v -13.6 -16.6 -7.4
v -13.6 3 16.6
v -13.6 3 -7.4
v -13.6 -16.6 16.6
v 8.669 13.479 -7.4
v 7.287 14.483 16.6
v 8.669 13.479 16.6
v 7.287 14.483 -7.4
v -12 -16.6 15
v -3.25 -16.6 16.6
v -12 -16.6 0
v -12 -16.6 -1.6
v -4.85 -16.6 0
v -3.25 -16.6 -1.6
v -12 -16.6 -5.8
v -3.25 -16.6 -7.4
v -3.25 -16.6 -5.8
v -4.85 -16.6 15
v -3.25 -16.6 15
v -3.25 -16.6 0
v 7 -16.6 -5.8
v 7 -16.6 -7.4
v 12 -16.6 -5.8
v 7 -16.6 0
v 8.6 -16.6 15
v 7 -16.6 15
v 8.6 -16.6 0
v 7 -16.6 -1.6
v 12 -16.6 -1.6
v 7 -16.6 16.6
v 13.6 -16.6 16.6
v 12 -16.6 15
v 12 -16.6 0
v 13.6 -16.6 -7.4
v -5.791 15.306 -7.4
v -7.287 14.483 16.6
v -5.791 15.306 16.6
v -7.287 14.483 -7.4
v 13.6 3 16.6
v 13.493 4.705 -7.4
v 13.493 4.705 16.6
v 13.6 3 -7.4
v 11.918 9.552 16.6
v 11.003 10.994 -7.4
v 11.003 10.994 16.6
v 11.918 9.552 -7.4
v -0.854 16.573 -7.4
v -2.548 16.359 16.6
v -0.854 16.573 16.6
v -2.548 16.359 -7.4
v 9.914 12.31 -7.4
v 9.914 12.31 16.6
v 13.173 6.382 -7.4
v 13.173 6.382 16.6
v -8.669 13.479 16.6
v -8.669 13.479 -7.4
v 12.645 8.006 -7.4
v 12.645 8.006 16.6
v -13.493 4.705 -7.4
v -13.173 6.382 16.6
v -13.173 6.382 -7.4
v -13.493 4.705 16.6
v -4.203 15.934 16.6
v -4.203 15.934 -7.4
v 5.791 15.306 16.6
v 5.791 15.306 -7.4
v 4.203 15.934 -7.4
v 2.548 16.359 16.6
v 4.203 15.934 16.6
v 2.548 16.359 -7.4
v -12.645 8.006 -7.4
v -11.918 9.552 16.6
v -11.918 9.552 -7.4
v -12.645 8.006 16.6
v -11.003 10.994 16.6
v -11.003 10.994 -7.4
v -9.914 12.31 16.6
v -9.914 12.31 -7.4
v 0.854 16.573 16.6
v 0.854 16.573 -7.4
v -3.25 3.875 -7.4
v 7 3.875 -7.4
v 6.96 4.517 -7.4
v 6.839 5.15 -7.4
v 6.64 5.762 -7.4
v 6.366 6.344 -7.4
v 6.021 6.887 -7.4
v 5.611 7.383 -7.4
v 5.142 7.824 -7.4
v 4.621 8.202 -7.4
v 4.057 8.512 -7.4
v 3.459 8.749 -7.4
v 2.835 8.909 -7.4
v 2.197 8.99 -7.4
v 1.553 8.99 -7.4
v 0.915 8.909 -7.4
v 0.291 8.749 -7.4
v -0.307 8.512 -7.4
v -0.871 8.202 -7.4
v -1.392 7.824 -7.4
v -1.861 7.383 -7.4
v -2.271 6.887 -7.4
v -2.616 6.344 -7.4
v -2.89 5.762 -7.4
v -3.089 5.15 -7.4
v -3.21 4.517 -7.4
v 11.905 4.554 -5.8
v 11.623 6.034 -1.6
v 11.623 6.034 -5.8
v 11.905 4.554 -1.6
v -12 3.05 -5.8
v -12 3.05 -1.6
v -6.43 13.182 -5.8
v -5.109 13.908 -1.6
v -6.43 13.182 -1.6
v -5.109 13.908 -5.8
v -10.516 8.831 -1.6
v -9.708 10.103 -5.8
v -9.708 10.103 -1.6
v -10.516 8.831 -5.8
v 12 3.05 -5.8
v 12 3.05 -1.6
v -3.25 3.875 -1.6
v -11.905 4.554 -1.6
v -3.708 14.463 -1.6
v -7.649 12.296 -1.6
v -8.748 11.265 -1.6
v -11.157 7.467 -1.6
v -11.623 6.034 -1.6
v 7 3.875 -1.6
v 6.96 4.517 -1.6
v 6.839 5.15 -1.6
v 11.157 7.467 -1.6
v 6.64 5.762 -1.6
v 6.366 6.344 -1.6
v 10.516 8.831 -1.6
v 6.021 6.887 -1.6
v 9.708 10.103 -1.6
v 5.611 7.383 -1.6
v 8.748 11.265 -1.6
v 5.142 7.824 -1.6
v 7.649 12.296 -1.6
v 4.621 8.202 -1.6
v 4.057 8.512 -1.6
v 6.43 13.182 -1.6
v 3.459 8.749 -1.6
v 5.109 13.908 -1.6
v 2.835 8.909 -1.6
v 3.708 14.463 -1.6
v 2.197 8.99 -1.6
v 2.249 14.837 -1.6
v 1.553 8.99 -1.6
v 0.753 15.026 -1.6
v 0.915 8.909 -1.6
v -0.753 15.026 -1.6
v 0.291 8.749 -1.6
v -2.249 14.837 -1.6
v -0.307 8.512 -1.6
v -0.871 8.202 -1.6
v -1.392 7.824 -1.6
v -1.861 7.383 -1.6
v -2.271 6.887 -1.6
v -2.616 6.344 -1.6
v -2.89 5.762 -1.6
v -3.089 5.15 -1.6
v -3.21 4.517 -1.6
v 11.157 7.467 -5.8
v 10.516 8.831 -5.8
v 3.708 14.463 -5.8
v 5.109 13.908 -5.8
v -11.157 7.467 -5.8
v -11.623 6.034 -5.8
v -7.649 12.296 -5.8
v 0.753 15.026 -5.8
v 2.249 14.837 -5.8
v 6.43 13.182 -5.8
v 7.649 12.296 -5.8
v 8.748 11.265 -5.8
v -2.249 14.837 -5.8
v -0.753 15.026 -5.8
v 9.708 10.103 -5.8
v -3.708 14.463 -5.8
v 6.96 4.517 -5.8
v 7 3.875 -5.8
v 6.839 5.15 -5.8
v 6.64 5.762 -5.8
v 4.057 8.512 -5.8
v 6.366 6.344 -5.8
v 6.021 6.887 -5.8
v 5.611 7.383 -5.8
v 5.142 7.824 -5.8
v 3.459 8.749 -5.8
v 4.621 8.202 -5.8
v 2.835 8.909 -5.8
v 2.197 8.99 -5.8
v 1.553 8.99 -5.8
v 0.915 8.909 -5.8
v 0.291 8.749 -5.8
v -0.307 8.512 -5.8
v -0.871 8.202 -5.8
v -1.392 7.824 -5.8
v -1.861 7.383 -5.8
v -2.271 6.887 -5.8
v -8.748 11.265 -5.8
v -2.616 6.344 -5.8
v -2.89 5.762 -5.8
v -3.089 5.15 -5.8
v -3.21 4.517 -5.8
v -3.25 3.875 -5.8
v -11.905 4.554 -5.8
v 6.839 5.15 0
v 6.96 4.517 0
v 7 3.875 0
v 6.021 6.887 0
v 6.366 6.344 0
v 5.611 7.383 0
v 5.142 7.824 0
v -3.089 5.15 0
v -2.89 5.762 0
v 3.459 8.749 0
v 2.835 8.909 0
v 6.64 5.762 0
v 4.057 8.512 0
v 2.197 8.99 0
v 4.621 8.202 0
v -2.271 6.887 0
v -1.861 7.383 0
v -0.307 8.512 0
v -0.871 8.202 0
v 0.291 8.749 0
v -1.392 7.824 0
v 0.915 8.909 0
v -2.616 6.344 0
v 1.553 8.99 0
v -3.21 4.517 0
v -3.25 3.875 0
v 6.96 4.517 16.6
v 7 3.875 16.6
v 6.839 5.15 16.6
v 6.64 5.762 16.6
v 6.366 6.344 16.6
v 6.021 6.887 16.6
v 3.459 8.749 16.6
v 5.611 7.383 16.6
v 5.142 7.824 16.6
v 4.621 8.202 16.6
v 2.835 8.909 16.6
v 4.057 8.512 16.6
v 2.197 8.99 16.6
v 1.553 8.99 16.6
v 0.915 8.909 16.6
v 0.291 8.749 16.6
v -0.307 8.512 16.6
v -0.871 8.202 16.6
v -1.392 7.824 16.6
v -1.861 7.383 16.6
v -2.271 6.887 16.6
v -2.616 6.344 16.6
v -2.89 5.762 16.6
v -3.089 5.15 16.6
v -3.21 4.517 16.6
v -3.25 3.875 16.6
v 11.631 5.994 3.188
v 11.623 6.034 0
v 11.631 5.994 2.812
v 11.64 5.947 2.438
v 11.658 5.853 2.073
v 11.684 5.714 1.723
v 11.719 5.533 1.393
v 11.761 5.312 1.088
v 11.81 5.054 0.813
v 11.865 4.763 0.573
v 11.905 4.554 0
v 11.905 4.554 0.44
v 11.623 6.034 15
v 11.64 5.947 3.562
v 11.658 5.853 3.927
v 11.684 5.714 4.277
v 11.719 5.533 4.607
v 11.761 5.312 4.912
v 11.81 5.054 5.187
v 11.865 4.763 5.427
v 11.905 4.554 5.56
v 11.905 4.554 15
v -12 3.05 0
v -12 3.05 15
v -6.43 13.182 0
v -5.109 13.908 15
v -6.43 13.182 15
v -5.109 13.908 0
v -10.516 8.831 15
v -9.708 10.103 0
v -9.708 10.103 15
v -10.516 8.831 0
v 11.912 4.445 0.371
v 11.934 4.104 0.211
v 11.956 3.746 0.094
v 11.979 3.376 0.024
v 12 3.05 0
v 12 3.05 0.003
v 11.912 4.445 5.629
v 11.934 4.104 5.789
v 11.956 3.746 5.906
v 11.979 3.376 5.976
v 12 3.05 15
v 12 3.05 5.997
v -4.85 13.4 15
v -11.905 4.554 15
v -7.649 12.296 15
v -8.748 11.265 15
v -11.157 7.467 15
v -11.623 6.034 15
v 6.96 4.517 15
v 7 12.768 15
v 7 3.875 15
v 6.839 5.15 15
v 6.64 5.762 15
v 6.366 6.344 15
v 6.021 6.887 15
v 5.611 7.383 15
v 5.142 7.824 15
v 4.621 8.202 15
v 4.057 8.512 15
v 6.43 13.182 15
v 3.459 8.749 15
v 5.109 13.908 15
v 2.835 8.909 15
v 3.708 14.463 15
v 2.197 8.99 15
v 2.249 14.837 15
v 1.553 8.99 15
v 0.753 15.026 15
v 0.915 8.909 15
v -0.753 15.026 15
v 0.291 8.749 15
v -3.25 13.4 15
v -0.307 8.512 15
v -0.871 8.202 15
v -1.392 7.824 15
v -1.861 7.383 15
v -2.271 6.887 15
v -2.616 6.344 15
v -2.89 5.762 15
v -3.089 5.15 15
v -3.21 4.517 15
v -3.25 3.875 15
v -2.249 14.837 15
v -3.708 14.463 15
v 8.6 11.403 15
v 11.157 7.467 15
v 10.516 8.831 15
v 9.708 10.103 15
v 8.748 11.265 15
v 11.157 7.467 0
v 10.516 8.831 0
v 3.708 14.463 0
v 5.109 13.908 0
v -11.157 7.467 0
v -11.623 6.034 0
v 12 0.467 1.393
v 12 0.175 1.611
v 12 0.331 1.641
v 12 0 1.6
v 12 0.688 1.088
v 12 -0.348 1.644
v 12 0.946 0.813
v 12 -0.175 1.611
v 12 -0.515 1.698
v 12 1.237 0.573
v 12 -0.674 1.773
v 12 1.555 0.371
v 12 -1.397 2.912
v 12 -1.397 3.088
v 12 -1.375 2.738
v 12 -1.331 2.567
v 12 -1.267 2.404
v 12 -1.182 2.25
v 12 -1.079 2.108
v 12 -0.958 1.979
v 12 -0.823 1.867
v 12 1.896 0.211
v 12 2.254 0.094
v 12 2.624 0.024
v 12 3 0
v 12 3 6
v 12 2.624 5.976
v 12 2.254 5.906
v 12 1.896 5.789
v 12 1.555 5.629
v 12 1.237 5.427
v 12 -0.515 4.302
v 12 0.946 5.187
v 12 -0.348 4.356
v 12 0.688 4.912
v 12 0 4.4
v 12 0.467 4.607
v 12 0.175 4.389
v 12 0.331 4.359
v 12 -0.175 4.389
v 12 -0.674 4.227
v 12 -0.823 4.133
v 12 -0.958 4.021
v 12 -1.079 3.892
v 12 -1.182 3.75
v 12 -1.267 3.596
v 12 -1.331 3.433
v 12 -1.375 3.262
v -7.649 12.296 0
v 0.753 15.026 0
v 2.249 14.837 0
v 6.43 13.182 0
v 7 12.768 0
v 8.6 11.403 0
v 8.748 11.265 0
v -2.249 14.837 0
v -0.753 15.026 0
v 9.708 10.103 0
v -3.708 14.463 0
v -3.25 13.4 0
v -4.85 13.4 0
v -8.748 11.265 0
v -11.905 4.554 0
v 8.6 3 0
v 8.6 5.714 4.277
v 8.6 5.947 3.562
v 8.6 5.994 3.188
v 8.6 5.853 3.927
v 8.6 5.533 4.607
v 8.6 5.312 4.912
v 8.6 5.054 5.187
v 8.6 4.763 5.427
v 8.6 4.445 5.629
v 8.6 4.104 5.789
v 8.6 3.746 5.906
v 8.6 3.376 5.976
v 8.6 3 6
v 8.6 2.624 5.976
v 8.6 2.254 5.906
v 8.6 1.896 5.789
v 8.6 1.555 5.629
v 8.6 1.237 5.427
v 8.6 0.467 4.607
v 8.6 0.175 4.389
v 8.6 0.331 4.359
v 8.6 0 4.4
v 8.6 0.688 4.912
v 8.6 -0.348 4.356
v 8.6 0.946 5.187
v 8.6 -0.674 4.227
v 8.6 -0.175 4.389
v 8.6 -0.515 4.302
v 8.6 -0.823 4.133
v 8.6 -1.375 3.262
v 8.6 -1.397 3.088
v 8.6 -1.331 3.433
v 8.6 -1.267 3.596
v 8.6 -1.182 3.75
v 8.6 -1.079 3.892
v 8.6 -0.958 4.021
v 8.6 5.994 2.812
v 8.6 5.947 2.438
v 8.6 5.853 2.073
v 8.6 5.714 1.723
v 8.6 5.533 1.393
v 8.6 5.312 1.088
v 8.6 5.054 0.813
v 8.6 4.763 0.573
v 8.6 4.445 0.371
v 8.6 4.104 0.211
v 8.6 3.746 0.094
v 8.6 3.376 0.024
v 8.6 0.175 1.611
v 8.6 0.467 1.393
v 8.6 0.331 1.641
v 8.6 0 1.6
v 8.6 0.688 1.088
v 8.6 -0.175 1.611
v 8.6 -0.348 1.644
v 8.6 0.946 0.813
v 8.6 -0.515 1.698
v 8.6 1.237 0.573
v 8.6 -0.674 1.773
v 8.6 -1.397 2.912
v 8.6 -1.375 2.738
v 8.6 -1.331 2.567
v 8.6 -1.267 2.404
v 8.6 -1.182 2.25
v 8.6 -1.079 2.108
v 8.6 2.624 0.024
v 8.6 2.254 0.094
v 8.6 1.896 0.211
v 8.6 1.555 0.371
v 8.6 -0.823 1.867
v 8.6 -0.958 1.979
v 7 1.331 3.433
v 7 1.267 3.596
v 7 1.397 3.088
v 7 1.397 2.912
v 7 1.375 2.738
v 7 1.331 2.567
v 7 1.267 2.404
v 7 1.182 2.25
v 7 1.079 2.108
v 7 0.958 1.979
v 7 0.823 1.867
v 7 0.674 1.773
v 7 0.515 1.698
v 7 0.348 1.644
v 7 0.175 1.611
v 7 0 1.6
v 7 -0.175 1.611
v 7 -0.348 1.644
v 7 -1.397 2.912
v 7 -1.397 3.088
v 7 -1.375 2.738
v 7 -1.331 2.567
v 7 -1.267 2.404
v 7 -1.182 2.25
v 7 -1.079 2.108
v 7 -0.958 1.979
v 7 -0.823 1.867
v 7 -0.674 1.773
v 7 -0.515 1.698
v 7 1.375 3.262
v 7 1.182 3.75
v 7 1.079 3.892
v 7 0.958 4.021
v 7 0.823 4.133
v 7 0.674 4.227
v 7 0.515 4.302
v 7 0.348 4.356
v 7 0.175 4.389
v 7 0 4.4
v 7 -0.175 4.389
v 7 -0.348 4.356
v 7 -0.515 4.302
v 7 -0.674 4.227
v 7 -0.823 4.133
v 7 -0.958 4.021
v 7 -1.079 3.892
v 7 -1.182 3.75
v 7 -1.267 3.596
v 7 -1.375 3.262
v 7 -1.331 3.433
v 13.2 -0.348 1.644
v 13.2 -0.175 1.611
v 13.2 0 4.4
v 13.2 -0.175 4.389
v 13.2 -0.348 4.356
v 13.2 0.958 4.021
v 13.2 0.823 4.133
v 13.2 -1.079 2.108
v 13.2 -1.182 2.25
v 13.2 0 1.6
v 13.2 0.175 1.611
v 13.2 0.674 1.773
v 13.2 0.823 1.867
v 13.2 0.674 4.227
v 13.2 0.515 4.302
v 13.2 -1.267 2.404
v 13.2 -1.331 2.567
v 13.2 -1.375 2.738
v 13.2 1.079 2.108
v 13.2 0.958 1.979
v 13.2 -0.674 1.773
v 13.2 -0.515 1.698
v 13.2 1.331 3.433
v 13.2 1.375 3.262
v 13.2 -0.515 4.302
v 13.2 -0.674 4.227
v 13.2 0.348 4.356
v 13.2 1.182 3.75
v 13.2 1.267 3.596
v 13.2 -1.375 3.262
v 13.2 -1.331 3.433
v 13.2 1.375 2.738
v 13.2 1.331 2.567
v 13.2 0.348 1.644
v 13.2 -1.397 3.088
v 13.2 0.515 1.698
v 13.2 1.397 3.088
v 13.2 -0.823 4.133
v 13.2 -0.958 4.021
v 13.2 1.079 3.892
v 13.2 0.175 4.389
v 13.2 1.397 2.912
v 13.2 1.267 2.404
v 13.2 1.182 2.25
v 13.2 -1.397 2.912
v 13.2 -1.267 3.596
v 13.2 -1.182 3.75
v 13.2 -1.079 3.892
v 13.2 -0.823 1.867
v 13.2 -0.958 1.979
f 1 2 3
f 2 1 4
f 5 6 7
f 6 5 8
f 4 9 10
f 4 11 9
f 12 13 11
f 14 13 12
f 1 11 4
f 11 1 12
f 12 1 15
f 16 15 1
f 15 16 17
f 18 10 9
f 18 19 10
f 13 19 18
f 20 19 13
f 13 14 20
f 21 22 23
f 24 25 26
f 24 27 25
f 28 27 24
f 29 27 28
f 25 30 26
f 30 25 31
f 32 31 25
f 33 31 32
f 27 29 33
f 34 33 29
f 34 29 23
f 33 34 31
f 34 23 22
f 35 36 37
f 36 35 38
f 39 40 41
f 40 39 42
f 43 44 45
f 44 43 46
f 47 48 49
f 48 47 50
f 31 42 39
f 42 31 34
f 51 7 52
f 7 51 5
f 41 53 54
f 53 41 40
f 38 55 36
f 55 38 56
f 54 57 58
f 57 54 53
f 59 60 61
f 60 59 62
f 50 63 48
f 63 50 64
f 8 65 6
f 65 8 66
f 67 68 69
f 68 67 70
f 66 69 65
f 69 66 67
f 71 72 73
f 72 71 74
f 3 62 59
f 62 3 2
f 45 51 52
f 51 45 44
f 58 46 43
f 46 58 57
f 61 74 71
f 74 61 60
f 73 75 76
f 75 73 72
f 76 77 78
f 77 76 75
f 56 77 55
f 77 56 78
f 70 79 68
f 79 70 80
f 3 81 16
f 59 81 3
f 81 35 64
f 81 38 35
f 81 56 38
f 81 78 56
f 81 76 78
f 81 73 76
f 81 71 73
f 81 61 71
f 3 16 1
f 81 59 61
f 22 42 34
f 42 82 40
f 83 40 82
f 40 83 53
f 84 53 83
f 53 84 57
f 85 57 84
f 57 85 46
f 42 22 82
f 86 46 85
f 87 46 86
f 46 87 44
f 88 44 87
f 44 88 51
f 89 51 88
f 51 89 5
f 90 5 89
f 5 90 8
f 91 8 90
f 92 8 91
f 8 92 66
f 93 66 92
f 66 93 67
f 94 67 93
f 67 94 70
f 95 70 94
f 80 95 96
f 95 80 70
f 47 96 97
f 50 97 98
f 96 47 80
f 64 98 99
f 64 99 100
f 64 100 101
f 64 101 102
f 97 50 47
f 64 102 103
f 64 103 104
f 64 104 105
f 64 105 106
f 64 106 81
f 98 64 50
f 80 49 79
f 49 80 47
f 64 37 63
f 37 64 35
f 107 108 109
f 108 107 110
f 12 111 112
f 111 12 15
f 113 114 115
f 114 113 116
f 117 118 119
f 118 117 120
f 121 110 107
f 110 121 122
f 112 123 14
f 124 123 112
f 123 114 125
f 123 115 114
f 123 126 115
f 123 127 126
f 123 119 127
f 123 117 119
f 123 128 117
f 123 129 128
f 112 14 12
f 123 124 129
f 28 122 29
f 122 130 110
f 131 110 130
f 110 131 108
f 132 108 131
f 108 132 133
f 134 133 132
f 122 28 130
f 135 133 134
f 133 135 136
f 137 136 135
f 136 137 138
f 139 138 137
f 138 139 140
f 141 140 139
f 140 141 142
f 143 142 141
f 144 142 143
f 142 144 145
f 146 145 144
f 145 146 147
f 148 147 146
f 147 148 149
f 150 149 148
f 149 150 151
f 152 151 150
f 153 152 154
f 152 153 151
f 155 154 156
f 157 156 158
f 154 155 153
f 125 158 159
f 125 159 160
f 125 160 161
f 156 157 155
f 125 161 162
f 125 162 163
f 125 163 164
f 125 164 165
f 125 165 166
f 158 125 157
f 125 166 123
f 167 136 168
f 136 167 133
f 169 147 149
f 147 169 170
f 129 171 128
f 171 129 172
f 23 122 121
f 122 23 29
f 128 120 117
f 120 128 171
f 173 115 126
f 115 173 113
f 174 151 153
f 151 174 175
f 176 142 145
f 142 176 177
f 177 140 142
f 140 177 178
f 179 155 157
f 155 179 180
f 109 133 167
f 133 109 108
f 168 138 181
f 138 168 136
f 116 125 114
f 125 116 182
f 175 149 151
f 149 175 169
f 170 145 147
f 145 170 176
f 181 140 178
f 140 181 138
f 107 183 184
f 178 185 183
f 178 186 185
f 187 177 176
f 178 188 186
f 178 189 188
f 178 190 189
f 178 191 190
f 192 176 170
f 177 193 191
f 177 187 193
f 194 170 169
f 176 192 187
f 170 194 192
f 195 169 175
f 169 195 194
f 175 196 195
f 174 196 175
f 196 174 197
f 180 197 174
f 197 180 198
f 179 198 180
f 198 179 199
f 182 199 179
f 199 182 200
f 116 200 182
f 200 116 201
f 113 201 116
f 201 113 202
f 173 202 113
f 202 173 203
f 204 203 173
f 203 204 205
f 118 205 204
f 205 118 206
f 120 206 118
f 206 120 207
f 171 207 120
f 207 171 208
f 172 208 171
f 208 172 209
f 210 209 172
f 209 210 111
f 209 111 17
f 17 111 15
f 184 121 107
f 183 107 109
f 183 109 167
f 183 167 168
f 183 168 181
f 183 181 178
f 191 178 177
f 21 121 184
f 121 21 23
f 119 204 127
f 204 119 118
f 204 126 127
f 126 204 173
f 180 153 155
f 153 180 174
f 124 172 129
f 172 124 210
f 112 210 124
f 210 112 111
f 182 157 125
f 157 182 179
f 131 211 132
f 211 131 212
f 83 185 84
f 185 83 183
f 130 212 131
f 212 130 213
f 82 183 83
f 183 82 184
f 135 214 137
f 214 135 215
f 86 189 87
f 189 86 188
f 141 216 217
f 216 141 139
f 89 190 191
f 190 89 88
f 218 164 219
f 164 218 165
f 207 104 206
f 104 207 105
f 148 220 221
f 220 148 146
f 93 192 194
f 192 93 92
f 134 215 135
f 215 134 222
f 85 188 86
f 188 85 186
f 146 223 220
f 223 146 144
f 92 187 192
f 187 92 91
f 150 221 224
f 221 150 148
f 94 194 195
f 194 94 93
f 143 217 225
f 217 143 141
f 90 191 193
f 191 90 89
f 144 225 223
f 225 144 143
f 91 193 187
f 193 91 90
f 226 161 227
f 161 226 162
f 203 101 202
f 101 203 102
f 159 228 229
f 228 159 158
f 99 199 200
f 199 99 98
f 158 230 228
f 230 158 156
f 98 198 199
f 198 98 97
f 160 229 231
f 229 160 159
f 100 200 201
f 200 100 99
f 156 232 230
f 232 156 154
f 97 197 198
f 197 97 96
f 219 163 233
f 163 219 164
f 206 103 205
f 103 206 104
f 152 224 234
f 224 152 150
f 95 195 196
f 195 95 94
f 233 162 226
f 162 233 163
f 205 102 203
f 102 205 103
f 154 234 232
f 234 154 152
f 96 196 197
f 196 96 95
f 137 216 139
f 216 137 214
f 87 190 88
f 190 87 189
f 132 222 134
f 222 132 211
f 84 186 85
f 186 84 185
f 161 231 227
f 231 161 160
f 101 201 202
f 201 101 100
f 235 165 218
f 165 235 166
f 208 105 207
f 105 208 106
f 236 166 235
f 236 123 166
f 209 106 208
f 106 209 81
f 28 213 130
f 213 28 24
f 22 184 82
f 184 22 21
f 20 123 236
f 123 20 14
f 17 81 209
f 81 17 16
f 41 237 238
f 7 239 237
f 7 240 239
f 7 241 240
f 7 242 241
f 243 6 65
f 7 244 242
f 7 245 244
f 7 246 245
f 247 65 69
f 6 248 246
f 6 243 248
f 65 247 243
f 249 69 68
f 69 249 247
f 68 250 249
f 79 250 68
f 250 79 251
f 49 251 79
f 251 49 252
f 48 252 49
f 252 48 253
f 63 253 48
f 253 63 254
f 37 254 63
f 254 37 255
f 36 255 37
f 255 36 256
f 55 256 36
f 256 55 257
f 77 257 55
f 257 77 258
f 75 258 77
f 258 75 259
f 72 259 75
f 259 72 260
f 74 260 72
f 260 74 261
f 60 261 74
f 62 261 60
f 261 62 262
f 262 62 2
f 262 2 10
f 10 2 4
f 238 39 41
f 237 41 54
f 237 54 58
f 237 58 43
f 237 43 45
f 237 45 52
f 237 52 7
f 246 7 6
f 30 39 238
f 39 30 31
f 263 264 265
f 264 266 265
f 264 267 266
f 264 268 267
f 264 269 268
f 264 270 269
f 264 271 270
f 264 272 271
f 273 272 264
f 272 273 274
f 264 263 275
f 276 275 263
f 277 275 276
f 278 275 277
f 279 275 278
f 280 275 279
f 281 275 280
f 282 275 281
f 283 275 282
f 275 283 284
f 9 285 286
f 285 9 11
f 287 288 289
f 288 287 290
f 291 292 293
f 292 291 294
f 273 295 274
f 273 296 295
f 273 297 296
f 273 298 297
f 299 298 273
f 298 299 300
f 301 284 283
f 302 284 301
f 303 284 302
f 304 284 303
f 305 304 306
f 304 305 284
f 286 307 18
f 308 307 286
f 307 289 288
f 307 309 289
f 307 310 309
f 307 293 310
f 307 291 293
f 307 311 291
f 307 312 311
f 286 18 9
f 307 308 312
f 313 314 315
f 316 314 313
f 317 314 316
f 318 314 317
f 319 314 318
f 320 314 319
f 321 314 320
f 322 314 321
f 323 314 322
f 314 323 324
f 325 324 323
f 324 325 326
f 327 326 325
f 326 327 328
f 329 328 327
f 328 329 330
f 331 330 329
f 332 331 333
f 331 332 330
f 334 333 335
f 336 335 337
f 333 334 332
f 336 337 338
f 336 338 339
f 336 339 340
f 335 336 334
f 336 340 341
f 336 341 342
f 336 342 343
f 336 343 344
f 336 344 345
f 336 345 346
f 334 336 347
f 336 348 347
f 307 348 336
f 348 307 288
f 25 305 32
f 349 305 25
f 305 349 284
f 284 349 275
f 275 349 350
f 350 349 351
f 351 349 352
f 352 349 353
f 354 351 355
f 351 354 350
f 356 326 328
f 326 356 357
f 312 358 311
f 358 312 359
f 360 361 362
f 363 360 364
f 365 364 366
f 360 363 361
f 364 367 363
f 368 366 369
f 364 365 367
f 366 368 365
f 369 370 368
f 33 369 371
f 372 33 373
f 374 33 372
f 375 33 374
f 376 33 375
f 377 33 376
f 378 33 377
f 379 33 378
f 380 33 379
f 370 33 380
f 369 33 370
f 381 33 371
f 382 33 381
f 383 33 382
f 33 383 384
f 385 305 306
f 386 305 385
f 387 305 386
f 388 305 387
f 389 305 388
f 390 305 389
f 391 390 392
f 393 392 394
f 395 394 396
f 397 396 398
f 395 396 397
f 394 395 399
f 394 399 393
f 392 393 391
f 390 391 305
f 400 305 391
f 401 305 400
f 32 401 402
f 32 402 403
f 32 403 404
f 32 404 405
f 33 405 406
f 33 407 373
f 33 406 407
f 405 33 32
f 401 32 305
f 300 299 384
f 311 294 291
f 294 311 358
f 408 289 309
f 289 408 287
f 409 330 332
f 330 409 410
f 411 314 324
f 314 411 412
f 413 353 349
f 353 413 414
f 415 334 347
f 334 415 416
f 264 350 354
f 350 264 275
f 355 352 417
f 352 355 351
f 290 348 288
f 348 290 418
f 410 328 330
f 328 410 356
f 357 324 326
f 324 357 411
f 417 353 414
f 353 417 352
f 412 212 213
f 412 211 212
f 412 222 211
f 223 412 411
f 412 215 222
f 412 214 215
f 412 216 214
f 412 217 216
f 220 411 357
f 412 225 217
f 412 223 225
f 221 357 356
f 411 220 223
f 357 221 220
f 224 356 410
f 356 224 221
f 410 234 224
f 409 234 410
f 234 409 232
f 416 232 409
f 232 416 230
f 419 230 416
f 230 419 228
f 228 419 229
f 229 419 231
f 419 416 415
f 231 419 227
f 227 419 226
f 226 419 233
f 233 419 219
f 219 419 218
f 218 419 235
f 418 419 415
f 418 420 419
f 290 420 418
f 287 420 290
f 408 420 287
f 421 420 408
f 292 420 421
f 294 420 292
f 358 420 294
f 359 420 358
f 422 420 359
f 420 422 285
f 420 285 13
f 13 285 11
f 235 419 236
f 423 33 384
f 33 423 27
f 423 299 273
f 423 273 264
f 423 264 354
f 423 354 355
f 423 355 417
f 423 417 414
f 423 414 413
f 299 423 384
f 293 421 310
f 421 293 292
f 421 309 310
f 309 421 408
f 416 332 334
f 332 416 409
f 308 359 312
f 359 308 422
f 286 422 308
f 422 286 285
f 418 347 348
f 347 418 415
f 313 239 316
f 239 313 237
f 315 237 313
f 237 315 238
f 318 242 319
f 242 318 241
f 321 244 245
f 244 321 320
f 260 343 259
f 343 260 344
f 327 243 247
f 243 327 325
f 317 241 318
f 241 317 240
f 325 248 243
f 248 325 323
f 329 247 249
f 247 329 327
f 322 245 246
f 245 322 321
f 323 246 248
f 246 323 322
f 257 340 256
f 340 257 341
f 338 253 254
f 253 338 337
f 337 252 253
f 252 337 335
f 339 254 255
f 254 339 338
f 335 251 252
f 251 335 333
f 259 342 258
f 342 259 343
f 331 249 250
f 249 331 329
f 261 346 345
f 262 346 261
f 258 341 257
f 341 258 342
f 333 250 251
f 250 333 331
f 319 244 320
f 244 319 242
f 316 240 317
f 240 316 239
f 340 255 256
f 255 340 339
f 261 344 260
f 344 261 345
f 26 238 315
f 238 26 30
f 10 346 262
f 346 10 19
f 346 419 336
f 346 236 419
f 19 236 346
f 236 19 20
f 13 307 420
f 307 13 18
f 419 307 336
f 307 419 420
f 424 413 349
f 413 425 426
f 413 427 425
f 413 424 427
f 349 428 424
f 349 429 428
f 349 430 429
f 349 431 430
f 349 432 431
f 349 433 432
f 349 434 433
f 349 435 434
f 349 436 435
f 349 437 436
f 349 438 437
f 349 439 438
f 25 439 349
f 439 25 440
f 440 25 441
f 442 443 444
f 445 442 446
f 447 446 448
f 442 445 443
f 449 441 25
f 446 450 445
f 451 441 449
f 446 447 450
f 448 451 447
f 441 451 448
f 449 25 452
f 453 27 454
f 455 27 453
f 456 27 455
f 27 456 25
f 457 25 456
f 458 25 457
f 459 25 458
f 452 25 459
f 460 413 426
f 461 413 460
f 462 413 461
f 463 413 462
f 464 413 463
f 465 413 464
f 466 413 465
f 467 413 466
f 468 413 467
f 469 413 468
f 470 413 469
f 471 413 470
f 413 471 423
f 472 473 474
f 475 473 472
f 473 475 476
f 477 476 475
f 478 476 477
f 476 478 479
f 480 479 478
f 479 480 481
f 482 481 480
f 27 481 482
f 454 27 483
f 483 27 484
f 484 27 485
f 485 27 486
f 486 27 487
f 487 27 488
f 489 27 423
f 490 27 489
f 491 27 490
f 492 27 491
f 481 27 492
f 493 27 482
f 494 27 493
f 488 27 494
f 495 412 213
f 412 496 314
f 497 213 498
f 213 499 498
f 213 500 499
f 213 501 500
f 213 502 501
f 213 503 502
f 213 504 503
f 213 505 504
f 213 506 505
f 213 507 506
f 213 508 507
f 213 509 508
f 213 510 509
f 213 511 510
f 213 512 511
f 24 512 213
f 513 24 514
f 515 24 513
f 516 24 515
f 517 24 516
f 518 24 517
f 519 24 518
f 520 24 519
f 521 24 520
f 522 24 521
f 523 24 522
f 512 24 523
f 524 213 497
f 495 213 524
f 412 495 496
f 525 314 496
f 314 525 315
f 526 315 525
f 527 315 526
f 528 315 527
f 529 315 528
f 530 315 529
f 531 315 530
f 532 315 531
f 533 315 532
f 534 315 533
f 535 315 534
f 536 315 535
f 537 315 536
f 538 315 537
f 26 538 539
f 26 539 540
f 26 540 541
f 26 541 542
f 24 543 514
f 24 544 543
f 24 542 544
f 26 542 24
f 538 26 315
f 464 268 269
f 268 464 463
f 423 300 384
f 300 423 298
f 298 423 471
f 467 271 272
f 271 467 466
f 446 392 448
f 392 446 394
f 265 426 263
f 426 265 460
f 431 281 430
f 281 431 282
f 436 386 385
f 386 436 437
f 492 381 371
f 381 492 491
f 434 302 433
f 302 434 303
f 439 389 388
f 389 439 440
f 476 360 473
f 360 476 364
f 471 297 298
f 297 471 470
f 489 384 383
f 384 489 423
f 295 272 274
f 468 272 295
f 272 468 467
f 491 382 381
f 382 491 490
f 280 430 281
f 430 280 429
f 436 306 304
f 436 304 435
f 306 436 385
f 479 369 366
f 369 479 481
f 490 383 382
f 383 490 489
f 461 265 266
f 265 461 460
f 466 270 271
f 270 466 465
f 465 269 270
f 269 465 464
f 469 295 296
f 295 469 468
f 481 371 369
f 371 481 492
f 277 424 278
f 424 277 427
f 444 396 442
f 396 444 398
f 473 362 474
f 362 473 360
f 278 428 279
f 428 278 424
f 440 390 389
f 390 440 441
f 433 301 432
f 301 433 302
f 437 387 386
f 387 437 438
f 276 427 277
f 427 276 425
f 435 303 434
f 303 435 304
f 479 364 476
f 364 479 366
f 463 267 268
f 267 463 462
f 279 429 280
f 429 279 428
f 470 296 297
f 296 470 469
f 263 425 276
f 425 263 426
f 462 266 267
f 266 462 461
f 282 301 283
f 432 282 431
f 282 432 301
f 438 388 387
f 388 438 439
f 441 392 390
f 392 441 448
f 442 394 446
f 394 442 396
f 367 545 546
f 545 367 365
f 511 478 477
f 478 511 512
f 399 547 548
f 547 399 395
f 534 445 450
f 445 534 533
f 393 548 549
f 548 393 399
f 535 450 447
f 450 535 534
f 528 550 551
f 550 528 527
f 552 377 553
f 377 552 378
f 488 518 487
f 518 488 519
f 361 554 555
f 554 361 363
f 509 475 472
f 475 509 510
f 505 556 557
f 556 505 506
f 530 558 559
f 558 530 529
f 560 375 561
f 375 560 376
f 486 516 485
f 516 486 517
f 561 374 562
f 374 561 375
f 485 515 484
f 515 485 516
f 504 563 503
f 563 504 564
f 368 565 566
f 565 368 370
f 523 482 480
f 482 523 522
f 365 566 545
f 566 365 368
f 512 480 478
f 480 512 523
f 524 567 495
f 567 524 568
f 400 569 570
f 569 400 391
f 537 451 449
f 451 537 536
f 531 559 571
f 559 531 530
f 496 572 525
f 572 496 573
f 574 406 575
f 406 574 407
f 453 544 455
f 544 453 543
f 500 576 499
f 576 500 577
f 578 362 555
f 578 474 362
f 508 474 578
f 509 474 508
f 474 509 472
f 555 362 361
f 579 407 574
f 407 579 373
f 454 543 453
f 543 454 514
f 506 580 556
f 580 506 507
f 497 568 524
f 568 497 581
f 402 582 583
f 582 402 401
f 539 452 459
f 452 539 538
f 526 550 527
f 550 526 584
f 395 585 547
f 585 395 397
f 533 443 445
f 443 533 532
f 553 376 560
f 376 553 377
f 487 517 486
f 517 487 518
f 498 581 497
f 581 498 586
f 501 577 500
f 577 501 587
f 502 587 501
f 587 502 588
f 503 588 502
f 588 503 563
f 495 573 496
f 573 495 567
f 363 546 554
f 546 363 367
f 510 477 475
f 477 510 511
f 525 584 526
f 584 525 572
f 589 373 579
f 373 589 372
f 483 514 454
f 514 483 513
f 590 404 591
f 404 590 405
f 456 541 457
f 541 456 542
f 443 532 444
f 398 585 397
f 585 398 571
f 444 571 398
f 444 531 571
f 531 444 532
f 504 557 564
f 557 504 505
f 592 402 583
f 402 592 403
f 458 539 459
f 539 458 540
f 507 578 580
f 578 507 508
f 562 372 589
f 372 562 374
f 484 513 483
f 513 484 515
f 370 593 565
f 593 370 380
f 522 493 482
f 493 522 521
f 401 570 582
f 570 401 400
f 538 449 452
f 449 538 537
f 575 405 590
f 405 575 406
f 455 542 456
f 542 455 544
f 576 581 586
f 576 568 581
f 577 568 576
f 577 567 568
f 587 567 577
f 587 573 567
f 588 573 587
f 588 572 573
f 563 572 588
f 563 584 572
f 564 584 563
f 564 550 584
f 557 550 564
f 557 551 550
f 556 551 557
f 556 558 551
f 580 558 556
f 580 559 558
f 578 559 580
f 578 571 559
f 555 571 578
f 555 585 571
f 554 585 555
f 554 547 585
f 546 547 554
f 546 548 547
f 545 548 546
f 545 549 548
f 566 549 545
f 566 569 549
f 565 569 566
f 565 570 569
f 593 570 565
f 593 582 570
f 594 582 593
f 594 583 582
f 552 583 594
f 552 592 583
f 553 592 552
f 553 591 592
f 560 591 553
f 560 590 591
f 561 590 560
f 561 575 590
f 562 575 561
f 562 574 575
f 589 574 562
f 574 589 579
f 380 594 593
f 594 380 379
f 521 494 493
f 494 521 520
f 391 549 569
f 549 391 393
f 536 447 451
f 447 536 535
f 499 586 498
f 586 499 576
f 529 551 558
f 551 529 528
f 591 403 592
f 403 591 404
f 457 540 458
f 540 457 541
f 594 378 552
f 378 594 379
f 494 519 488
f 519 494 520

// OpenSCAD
// file: ../../lib/rounded_square.scad
$fn = 50;

// ------------------------------------------------------------
// Helper functions
// ------------------------------------------------------------

function normalize_radius(radius) = is_list(radius)
                                        ? radius
                                        : [ radius, radius, radius, radius ];

// ------------------------------------------------------------
// Rounded Square
// ------------------------------------------------------------
//
// Uses 4 corners and a hull() to connect them to a rectangle.
// Rounded corners are circles while straight corners are squares.
//
// Arguments:
//
// - size: [x, y]
// - radius: r or [r_top_left, r_top_right, r_bottom_right, r_bottom_left]
//
module rounded_square(size, radius) {
  radius = normalize_radius(radius);
  assert(len(radius) == 4,
         "Invalid radius value, must be either single value or array of 4");

  max_radius = min(size.x / 2, size.y / 2);

  r_top_left = min(radius[0], max_radius);
  r_top_right = min(radius[1], max_radius);
  r_bottom_right = min(radius[2], max_radius);
  r_bottom_left = min(radius[3], max_radius);

  hull() {
    if (r_top_left == 0) {
      translate([ -size.x / 2, size.y / 2 - 1 ]) square([ 1, 1 ]);
    } else {
      x = -size.x / 2 + r_top_left;
      y = size.y / 2 - r_top_left;
      translate([ x, y ]) circle(r = r_top_left);
    }

    if (r_top_right == 0) {
      translate([ size.x / 2 - 1, size.y / 2 - 1 ]) square([ 1, 1 ]);
    } else {
      x = size.x / 2 - r_top_right;
      y = size.y / 2 - r_top_right;
      translate([ x, y ]) circle(r = r_top_right);
    }

    if (r_bottom_right == 0) {
      translate([ size.x / 2 - 1, -size.y / 2 ]) square([ 1, 1 ]);
    } else {
      x = size.x / 2 - r_bottom_right;
      y = -size.y / 2 + r_bottom_right;
      translate([ x, y ]) circle(r = r_bottom_right);
    }

    if (r_bottom_left == 0) {
      translate([ -size.x / 2, -size.y / 2 ]) square([ 1, 1 ]);
    } else {
      x = -size.x / 2 + r_bottom_left;
      y = -size.y / 2 + r_bottom_left;
      translate([ x, y ]) circle(r = r_bottom_left);
    }
  }
}

// ------------------------------------------------------------
// Rounded Shell
// ------------------------------------------------------------
//
// Arguments:
//
// - size: [x, y]
// - thickness
// - outer_radius: r or [r_top_left, r_top_right, r_bottom_right, r_bottom_left]
// - inner_radius: optional, if missing will revert to inner_radius
//
module rounded_shell(size, thickness, outer_radius, inner_radius) {
  inner_radius = is_undef(inner_radius) ? outer_radius : inner_radius;
  inner_size = [ size.x - thickness * 2, size.y - thickness * 2 ];

  difference() {
    rounded_square(size, outer_radius);
    rounded_square(inner_size, inner_radius);
  }
}

// ------------------------------------------------------------
// Test
// ------------------------------------------------------------

// rounded_square([ 40, 20 ], radius = 3);
// rounded_square([ 40, 20 ], radius = [ 10, 3, 3, 10 ]);
// rounded_square([ 40, 20 ], radius = [ 10, 3, 10, 0 ]);
rounded_shell([ 40, 20 ], thickness = 2, outer_radius = [ 3, 3, 0, 3 ],
              inner_radius = [ 5, 5, 0, 5 ]);
// main file
$fn = 50;

use <../../lib/rounded_square.scad>

function calc_outer_size(hook_size, wall_width) = [
  hook_size.x + 2 * wall_width, hook_size.y + 2 * wall_width, hook_size.z + 2 *
  wall_width
];

function calc_pole_position(outer_size, pole_diameter, wall_width, pole_dist) =
    [
      // x:
      outer_size.x / 2 - pole_diameter / 2 - wall_width - pole_dist.x,
      // y:
      outer_size.y / 2 - pole_diameter / 2 - wall_width - pole_dist.y
    ];

module curtain_hook_cover(hook_size, pole_diameter, pole_dist, wall_width = 1.6,
                          screw_area_z = 15, screw_hole_diameter = 2.8) {
  outer_size = calc_outer_size(hook_size, wall_width);
  pole_position =
      calc_pole_position(outer_size, pole_diameter, wall_width, pole_dist);

  // hook cover
  translate([ 0, 0, -hook_size.z / 2 - wall_width ])
      curtain_hook_component(hook_size, pole_diameter, pole_dist, wall_width);

  // screw part
  screw_part_size = [ hook_size.x, hook_size.y, screw_area_z ];

  difference() {
    union() {
      translate([ 0, 0, screw_area_z / 2 ]) curtain_hook_component(
          screw_part_size, pole_diameter, pole_dist, wall_width);

      // wall1
      wall1_x = pole_position.x - pole_diameter / 2 - wall_width;
      wall1_y = -hook_size.y / 2 - wall_width;
      translate([ wall1_x, wall1_y, 0 ])
          cube([ wall_width, hook_size.y, screw_area_z ]);

      // wall2
      wall2_x = pole_position.x + pole_diameter / 2;
      wall2_y = wall1_y;
      translate([ wall2_x, wall2_y, 0 ])
          cube([ wall_width, hook_size.y, screw_area_z ]);

      // screw tube
      screw_tube_diameter = screw_hole_diameter + wall_width * 2;
      screw_tube_x = wall2_x + pole_dist.x / 2;
      screw_tube_y = screw_tube_diameter / 2;
      translate([ screw_tube_x, screw_tube_y, screw_tube_diameter / 2 ])
          rotate([ 0, 90, 0 ])
              cylinder(h = pole_dist.x, d = screw_tube_diameter, center = true);
    }

    // screw hole
    screw_hole_height = pole_dist.x + wall_width;
    screw_hole_x = pole_dist.x + wall_width;
    screw_hole_z = screw_hole_diameter / 2 + wall_width;
    translate([ screw_hole_x, 0, screw_hole_z ]) rotate([ 0, 90, 0 ])
#cylinder(h = screw_hole_height, d = screw_hole_diameter);
  }
}

// hook_size = [x, y, z]
// pole_dist = [x, y]
module curtain_hook_component(hook_size, pole_diameter, pole_dist,
                              wall_width = 1.6) {
  outer_size = calc_outer_size(hook_size, wall_width);
  pole_position =
      calc_pole_position(outer_size, pole_diameter, wall_width, pole_dist);

  difference() {
    linear_extrude(outer_size.z, center = true)
        rounded_square([ outer_size.x, outer_size.y ],
                       [ outer_size.x / 2, outer_size.x / 2, 0, 0 ]);

    linear_extrude(hook_size.z, center = true) translate([ 0, -wall_width / 2 ])
        rounded_square([ hook_size.x, hook_size.y + wall_width + 0.1 ],
                       [ hook_size.x / 2, hook_size.x / 2, 0, 0 ]);

    translate(pole_position)
        cylinder(h = outer_size.z + 0.1, d = pole_diameter, center = true);

    cube_position = [
      pole_position.x,
      // y:
      -(pole_dist.y + wall_width + pole_diameter / 2)
    ];
    translate(cube_position) cube(
        [ pole_diameter, outer_size.y, outer_size.z + 0.1 ], center = true);
  }
}

// Mark 1 - too small
// curtain_hook_cover(hook_size = [ 23.9, 30, 3.9 ], pole_diameter = 10.5,
//                    pole_dist_x = 5, pole_dist_y = 6);

// Mark 2
curtain_hook_cover(hook_size = [ 24, 30, 4.2 ], pole_diameter = 10.25,
                   pole_dist = [ 5, 6 ]);
